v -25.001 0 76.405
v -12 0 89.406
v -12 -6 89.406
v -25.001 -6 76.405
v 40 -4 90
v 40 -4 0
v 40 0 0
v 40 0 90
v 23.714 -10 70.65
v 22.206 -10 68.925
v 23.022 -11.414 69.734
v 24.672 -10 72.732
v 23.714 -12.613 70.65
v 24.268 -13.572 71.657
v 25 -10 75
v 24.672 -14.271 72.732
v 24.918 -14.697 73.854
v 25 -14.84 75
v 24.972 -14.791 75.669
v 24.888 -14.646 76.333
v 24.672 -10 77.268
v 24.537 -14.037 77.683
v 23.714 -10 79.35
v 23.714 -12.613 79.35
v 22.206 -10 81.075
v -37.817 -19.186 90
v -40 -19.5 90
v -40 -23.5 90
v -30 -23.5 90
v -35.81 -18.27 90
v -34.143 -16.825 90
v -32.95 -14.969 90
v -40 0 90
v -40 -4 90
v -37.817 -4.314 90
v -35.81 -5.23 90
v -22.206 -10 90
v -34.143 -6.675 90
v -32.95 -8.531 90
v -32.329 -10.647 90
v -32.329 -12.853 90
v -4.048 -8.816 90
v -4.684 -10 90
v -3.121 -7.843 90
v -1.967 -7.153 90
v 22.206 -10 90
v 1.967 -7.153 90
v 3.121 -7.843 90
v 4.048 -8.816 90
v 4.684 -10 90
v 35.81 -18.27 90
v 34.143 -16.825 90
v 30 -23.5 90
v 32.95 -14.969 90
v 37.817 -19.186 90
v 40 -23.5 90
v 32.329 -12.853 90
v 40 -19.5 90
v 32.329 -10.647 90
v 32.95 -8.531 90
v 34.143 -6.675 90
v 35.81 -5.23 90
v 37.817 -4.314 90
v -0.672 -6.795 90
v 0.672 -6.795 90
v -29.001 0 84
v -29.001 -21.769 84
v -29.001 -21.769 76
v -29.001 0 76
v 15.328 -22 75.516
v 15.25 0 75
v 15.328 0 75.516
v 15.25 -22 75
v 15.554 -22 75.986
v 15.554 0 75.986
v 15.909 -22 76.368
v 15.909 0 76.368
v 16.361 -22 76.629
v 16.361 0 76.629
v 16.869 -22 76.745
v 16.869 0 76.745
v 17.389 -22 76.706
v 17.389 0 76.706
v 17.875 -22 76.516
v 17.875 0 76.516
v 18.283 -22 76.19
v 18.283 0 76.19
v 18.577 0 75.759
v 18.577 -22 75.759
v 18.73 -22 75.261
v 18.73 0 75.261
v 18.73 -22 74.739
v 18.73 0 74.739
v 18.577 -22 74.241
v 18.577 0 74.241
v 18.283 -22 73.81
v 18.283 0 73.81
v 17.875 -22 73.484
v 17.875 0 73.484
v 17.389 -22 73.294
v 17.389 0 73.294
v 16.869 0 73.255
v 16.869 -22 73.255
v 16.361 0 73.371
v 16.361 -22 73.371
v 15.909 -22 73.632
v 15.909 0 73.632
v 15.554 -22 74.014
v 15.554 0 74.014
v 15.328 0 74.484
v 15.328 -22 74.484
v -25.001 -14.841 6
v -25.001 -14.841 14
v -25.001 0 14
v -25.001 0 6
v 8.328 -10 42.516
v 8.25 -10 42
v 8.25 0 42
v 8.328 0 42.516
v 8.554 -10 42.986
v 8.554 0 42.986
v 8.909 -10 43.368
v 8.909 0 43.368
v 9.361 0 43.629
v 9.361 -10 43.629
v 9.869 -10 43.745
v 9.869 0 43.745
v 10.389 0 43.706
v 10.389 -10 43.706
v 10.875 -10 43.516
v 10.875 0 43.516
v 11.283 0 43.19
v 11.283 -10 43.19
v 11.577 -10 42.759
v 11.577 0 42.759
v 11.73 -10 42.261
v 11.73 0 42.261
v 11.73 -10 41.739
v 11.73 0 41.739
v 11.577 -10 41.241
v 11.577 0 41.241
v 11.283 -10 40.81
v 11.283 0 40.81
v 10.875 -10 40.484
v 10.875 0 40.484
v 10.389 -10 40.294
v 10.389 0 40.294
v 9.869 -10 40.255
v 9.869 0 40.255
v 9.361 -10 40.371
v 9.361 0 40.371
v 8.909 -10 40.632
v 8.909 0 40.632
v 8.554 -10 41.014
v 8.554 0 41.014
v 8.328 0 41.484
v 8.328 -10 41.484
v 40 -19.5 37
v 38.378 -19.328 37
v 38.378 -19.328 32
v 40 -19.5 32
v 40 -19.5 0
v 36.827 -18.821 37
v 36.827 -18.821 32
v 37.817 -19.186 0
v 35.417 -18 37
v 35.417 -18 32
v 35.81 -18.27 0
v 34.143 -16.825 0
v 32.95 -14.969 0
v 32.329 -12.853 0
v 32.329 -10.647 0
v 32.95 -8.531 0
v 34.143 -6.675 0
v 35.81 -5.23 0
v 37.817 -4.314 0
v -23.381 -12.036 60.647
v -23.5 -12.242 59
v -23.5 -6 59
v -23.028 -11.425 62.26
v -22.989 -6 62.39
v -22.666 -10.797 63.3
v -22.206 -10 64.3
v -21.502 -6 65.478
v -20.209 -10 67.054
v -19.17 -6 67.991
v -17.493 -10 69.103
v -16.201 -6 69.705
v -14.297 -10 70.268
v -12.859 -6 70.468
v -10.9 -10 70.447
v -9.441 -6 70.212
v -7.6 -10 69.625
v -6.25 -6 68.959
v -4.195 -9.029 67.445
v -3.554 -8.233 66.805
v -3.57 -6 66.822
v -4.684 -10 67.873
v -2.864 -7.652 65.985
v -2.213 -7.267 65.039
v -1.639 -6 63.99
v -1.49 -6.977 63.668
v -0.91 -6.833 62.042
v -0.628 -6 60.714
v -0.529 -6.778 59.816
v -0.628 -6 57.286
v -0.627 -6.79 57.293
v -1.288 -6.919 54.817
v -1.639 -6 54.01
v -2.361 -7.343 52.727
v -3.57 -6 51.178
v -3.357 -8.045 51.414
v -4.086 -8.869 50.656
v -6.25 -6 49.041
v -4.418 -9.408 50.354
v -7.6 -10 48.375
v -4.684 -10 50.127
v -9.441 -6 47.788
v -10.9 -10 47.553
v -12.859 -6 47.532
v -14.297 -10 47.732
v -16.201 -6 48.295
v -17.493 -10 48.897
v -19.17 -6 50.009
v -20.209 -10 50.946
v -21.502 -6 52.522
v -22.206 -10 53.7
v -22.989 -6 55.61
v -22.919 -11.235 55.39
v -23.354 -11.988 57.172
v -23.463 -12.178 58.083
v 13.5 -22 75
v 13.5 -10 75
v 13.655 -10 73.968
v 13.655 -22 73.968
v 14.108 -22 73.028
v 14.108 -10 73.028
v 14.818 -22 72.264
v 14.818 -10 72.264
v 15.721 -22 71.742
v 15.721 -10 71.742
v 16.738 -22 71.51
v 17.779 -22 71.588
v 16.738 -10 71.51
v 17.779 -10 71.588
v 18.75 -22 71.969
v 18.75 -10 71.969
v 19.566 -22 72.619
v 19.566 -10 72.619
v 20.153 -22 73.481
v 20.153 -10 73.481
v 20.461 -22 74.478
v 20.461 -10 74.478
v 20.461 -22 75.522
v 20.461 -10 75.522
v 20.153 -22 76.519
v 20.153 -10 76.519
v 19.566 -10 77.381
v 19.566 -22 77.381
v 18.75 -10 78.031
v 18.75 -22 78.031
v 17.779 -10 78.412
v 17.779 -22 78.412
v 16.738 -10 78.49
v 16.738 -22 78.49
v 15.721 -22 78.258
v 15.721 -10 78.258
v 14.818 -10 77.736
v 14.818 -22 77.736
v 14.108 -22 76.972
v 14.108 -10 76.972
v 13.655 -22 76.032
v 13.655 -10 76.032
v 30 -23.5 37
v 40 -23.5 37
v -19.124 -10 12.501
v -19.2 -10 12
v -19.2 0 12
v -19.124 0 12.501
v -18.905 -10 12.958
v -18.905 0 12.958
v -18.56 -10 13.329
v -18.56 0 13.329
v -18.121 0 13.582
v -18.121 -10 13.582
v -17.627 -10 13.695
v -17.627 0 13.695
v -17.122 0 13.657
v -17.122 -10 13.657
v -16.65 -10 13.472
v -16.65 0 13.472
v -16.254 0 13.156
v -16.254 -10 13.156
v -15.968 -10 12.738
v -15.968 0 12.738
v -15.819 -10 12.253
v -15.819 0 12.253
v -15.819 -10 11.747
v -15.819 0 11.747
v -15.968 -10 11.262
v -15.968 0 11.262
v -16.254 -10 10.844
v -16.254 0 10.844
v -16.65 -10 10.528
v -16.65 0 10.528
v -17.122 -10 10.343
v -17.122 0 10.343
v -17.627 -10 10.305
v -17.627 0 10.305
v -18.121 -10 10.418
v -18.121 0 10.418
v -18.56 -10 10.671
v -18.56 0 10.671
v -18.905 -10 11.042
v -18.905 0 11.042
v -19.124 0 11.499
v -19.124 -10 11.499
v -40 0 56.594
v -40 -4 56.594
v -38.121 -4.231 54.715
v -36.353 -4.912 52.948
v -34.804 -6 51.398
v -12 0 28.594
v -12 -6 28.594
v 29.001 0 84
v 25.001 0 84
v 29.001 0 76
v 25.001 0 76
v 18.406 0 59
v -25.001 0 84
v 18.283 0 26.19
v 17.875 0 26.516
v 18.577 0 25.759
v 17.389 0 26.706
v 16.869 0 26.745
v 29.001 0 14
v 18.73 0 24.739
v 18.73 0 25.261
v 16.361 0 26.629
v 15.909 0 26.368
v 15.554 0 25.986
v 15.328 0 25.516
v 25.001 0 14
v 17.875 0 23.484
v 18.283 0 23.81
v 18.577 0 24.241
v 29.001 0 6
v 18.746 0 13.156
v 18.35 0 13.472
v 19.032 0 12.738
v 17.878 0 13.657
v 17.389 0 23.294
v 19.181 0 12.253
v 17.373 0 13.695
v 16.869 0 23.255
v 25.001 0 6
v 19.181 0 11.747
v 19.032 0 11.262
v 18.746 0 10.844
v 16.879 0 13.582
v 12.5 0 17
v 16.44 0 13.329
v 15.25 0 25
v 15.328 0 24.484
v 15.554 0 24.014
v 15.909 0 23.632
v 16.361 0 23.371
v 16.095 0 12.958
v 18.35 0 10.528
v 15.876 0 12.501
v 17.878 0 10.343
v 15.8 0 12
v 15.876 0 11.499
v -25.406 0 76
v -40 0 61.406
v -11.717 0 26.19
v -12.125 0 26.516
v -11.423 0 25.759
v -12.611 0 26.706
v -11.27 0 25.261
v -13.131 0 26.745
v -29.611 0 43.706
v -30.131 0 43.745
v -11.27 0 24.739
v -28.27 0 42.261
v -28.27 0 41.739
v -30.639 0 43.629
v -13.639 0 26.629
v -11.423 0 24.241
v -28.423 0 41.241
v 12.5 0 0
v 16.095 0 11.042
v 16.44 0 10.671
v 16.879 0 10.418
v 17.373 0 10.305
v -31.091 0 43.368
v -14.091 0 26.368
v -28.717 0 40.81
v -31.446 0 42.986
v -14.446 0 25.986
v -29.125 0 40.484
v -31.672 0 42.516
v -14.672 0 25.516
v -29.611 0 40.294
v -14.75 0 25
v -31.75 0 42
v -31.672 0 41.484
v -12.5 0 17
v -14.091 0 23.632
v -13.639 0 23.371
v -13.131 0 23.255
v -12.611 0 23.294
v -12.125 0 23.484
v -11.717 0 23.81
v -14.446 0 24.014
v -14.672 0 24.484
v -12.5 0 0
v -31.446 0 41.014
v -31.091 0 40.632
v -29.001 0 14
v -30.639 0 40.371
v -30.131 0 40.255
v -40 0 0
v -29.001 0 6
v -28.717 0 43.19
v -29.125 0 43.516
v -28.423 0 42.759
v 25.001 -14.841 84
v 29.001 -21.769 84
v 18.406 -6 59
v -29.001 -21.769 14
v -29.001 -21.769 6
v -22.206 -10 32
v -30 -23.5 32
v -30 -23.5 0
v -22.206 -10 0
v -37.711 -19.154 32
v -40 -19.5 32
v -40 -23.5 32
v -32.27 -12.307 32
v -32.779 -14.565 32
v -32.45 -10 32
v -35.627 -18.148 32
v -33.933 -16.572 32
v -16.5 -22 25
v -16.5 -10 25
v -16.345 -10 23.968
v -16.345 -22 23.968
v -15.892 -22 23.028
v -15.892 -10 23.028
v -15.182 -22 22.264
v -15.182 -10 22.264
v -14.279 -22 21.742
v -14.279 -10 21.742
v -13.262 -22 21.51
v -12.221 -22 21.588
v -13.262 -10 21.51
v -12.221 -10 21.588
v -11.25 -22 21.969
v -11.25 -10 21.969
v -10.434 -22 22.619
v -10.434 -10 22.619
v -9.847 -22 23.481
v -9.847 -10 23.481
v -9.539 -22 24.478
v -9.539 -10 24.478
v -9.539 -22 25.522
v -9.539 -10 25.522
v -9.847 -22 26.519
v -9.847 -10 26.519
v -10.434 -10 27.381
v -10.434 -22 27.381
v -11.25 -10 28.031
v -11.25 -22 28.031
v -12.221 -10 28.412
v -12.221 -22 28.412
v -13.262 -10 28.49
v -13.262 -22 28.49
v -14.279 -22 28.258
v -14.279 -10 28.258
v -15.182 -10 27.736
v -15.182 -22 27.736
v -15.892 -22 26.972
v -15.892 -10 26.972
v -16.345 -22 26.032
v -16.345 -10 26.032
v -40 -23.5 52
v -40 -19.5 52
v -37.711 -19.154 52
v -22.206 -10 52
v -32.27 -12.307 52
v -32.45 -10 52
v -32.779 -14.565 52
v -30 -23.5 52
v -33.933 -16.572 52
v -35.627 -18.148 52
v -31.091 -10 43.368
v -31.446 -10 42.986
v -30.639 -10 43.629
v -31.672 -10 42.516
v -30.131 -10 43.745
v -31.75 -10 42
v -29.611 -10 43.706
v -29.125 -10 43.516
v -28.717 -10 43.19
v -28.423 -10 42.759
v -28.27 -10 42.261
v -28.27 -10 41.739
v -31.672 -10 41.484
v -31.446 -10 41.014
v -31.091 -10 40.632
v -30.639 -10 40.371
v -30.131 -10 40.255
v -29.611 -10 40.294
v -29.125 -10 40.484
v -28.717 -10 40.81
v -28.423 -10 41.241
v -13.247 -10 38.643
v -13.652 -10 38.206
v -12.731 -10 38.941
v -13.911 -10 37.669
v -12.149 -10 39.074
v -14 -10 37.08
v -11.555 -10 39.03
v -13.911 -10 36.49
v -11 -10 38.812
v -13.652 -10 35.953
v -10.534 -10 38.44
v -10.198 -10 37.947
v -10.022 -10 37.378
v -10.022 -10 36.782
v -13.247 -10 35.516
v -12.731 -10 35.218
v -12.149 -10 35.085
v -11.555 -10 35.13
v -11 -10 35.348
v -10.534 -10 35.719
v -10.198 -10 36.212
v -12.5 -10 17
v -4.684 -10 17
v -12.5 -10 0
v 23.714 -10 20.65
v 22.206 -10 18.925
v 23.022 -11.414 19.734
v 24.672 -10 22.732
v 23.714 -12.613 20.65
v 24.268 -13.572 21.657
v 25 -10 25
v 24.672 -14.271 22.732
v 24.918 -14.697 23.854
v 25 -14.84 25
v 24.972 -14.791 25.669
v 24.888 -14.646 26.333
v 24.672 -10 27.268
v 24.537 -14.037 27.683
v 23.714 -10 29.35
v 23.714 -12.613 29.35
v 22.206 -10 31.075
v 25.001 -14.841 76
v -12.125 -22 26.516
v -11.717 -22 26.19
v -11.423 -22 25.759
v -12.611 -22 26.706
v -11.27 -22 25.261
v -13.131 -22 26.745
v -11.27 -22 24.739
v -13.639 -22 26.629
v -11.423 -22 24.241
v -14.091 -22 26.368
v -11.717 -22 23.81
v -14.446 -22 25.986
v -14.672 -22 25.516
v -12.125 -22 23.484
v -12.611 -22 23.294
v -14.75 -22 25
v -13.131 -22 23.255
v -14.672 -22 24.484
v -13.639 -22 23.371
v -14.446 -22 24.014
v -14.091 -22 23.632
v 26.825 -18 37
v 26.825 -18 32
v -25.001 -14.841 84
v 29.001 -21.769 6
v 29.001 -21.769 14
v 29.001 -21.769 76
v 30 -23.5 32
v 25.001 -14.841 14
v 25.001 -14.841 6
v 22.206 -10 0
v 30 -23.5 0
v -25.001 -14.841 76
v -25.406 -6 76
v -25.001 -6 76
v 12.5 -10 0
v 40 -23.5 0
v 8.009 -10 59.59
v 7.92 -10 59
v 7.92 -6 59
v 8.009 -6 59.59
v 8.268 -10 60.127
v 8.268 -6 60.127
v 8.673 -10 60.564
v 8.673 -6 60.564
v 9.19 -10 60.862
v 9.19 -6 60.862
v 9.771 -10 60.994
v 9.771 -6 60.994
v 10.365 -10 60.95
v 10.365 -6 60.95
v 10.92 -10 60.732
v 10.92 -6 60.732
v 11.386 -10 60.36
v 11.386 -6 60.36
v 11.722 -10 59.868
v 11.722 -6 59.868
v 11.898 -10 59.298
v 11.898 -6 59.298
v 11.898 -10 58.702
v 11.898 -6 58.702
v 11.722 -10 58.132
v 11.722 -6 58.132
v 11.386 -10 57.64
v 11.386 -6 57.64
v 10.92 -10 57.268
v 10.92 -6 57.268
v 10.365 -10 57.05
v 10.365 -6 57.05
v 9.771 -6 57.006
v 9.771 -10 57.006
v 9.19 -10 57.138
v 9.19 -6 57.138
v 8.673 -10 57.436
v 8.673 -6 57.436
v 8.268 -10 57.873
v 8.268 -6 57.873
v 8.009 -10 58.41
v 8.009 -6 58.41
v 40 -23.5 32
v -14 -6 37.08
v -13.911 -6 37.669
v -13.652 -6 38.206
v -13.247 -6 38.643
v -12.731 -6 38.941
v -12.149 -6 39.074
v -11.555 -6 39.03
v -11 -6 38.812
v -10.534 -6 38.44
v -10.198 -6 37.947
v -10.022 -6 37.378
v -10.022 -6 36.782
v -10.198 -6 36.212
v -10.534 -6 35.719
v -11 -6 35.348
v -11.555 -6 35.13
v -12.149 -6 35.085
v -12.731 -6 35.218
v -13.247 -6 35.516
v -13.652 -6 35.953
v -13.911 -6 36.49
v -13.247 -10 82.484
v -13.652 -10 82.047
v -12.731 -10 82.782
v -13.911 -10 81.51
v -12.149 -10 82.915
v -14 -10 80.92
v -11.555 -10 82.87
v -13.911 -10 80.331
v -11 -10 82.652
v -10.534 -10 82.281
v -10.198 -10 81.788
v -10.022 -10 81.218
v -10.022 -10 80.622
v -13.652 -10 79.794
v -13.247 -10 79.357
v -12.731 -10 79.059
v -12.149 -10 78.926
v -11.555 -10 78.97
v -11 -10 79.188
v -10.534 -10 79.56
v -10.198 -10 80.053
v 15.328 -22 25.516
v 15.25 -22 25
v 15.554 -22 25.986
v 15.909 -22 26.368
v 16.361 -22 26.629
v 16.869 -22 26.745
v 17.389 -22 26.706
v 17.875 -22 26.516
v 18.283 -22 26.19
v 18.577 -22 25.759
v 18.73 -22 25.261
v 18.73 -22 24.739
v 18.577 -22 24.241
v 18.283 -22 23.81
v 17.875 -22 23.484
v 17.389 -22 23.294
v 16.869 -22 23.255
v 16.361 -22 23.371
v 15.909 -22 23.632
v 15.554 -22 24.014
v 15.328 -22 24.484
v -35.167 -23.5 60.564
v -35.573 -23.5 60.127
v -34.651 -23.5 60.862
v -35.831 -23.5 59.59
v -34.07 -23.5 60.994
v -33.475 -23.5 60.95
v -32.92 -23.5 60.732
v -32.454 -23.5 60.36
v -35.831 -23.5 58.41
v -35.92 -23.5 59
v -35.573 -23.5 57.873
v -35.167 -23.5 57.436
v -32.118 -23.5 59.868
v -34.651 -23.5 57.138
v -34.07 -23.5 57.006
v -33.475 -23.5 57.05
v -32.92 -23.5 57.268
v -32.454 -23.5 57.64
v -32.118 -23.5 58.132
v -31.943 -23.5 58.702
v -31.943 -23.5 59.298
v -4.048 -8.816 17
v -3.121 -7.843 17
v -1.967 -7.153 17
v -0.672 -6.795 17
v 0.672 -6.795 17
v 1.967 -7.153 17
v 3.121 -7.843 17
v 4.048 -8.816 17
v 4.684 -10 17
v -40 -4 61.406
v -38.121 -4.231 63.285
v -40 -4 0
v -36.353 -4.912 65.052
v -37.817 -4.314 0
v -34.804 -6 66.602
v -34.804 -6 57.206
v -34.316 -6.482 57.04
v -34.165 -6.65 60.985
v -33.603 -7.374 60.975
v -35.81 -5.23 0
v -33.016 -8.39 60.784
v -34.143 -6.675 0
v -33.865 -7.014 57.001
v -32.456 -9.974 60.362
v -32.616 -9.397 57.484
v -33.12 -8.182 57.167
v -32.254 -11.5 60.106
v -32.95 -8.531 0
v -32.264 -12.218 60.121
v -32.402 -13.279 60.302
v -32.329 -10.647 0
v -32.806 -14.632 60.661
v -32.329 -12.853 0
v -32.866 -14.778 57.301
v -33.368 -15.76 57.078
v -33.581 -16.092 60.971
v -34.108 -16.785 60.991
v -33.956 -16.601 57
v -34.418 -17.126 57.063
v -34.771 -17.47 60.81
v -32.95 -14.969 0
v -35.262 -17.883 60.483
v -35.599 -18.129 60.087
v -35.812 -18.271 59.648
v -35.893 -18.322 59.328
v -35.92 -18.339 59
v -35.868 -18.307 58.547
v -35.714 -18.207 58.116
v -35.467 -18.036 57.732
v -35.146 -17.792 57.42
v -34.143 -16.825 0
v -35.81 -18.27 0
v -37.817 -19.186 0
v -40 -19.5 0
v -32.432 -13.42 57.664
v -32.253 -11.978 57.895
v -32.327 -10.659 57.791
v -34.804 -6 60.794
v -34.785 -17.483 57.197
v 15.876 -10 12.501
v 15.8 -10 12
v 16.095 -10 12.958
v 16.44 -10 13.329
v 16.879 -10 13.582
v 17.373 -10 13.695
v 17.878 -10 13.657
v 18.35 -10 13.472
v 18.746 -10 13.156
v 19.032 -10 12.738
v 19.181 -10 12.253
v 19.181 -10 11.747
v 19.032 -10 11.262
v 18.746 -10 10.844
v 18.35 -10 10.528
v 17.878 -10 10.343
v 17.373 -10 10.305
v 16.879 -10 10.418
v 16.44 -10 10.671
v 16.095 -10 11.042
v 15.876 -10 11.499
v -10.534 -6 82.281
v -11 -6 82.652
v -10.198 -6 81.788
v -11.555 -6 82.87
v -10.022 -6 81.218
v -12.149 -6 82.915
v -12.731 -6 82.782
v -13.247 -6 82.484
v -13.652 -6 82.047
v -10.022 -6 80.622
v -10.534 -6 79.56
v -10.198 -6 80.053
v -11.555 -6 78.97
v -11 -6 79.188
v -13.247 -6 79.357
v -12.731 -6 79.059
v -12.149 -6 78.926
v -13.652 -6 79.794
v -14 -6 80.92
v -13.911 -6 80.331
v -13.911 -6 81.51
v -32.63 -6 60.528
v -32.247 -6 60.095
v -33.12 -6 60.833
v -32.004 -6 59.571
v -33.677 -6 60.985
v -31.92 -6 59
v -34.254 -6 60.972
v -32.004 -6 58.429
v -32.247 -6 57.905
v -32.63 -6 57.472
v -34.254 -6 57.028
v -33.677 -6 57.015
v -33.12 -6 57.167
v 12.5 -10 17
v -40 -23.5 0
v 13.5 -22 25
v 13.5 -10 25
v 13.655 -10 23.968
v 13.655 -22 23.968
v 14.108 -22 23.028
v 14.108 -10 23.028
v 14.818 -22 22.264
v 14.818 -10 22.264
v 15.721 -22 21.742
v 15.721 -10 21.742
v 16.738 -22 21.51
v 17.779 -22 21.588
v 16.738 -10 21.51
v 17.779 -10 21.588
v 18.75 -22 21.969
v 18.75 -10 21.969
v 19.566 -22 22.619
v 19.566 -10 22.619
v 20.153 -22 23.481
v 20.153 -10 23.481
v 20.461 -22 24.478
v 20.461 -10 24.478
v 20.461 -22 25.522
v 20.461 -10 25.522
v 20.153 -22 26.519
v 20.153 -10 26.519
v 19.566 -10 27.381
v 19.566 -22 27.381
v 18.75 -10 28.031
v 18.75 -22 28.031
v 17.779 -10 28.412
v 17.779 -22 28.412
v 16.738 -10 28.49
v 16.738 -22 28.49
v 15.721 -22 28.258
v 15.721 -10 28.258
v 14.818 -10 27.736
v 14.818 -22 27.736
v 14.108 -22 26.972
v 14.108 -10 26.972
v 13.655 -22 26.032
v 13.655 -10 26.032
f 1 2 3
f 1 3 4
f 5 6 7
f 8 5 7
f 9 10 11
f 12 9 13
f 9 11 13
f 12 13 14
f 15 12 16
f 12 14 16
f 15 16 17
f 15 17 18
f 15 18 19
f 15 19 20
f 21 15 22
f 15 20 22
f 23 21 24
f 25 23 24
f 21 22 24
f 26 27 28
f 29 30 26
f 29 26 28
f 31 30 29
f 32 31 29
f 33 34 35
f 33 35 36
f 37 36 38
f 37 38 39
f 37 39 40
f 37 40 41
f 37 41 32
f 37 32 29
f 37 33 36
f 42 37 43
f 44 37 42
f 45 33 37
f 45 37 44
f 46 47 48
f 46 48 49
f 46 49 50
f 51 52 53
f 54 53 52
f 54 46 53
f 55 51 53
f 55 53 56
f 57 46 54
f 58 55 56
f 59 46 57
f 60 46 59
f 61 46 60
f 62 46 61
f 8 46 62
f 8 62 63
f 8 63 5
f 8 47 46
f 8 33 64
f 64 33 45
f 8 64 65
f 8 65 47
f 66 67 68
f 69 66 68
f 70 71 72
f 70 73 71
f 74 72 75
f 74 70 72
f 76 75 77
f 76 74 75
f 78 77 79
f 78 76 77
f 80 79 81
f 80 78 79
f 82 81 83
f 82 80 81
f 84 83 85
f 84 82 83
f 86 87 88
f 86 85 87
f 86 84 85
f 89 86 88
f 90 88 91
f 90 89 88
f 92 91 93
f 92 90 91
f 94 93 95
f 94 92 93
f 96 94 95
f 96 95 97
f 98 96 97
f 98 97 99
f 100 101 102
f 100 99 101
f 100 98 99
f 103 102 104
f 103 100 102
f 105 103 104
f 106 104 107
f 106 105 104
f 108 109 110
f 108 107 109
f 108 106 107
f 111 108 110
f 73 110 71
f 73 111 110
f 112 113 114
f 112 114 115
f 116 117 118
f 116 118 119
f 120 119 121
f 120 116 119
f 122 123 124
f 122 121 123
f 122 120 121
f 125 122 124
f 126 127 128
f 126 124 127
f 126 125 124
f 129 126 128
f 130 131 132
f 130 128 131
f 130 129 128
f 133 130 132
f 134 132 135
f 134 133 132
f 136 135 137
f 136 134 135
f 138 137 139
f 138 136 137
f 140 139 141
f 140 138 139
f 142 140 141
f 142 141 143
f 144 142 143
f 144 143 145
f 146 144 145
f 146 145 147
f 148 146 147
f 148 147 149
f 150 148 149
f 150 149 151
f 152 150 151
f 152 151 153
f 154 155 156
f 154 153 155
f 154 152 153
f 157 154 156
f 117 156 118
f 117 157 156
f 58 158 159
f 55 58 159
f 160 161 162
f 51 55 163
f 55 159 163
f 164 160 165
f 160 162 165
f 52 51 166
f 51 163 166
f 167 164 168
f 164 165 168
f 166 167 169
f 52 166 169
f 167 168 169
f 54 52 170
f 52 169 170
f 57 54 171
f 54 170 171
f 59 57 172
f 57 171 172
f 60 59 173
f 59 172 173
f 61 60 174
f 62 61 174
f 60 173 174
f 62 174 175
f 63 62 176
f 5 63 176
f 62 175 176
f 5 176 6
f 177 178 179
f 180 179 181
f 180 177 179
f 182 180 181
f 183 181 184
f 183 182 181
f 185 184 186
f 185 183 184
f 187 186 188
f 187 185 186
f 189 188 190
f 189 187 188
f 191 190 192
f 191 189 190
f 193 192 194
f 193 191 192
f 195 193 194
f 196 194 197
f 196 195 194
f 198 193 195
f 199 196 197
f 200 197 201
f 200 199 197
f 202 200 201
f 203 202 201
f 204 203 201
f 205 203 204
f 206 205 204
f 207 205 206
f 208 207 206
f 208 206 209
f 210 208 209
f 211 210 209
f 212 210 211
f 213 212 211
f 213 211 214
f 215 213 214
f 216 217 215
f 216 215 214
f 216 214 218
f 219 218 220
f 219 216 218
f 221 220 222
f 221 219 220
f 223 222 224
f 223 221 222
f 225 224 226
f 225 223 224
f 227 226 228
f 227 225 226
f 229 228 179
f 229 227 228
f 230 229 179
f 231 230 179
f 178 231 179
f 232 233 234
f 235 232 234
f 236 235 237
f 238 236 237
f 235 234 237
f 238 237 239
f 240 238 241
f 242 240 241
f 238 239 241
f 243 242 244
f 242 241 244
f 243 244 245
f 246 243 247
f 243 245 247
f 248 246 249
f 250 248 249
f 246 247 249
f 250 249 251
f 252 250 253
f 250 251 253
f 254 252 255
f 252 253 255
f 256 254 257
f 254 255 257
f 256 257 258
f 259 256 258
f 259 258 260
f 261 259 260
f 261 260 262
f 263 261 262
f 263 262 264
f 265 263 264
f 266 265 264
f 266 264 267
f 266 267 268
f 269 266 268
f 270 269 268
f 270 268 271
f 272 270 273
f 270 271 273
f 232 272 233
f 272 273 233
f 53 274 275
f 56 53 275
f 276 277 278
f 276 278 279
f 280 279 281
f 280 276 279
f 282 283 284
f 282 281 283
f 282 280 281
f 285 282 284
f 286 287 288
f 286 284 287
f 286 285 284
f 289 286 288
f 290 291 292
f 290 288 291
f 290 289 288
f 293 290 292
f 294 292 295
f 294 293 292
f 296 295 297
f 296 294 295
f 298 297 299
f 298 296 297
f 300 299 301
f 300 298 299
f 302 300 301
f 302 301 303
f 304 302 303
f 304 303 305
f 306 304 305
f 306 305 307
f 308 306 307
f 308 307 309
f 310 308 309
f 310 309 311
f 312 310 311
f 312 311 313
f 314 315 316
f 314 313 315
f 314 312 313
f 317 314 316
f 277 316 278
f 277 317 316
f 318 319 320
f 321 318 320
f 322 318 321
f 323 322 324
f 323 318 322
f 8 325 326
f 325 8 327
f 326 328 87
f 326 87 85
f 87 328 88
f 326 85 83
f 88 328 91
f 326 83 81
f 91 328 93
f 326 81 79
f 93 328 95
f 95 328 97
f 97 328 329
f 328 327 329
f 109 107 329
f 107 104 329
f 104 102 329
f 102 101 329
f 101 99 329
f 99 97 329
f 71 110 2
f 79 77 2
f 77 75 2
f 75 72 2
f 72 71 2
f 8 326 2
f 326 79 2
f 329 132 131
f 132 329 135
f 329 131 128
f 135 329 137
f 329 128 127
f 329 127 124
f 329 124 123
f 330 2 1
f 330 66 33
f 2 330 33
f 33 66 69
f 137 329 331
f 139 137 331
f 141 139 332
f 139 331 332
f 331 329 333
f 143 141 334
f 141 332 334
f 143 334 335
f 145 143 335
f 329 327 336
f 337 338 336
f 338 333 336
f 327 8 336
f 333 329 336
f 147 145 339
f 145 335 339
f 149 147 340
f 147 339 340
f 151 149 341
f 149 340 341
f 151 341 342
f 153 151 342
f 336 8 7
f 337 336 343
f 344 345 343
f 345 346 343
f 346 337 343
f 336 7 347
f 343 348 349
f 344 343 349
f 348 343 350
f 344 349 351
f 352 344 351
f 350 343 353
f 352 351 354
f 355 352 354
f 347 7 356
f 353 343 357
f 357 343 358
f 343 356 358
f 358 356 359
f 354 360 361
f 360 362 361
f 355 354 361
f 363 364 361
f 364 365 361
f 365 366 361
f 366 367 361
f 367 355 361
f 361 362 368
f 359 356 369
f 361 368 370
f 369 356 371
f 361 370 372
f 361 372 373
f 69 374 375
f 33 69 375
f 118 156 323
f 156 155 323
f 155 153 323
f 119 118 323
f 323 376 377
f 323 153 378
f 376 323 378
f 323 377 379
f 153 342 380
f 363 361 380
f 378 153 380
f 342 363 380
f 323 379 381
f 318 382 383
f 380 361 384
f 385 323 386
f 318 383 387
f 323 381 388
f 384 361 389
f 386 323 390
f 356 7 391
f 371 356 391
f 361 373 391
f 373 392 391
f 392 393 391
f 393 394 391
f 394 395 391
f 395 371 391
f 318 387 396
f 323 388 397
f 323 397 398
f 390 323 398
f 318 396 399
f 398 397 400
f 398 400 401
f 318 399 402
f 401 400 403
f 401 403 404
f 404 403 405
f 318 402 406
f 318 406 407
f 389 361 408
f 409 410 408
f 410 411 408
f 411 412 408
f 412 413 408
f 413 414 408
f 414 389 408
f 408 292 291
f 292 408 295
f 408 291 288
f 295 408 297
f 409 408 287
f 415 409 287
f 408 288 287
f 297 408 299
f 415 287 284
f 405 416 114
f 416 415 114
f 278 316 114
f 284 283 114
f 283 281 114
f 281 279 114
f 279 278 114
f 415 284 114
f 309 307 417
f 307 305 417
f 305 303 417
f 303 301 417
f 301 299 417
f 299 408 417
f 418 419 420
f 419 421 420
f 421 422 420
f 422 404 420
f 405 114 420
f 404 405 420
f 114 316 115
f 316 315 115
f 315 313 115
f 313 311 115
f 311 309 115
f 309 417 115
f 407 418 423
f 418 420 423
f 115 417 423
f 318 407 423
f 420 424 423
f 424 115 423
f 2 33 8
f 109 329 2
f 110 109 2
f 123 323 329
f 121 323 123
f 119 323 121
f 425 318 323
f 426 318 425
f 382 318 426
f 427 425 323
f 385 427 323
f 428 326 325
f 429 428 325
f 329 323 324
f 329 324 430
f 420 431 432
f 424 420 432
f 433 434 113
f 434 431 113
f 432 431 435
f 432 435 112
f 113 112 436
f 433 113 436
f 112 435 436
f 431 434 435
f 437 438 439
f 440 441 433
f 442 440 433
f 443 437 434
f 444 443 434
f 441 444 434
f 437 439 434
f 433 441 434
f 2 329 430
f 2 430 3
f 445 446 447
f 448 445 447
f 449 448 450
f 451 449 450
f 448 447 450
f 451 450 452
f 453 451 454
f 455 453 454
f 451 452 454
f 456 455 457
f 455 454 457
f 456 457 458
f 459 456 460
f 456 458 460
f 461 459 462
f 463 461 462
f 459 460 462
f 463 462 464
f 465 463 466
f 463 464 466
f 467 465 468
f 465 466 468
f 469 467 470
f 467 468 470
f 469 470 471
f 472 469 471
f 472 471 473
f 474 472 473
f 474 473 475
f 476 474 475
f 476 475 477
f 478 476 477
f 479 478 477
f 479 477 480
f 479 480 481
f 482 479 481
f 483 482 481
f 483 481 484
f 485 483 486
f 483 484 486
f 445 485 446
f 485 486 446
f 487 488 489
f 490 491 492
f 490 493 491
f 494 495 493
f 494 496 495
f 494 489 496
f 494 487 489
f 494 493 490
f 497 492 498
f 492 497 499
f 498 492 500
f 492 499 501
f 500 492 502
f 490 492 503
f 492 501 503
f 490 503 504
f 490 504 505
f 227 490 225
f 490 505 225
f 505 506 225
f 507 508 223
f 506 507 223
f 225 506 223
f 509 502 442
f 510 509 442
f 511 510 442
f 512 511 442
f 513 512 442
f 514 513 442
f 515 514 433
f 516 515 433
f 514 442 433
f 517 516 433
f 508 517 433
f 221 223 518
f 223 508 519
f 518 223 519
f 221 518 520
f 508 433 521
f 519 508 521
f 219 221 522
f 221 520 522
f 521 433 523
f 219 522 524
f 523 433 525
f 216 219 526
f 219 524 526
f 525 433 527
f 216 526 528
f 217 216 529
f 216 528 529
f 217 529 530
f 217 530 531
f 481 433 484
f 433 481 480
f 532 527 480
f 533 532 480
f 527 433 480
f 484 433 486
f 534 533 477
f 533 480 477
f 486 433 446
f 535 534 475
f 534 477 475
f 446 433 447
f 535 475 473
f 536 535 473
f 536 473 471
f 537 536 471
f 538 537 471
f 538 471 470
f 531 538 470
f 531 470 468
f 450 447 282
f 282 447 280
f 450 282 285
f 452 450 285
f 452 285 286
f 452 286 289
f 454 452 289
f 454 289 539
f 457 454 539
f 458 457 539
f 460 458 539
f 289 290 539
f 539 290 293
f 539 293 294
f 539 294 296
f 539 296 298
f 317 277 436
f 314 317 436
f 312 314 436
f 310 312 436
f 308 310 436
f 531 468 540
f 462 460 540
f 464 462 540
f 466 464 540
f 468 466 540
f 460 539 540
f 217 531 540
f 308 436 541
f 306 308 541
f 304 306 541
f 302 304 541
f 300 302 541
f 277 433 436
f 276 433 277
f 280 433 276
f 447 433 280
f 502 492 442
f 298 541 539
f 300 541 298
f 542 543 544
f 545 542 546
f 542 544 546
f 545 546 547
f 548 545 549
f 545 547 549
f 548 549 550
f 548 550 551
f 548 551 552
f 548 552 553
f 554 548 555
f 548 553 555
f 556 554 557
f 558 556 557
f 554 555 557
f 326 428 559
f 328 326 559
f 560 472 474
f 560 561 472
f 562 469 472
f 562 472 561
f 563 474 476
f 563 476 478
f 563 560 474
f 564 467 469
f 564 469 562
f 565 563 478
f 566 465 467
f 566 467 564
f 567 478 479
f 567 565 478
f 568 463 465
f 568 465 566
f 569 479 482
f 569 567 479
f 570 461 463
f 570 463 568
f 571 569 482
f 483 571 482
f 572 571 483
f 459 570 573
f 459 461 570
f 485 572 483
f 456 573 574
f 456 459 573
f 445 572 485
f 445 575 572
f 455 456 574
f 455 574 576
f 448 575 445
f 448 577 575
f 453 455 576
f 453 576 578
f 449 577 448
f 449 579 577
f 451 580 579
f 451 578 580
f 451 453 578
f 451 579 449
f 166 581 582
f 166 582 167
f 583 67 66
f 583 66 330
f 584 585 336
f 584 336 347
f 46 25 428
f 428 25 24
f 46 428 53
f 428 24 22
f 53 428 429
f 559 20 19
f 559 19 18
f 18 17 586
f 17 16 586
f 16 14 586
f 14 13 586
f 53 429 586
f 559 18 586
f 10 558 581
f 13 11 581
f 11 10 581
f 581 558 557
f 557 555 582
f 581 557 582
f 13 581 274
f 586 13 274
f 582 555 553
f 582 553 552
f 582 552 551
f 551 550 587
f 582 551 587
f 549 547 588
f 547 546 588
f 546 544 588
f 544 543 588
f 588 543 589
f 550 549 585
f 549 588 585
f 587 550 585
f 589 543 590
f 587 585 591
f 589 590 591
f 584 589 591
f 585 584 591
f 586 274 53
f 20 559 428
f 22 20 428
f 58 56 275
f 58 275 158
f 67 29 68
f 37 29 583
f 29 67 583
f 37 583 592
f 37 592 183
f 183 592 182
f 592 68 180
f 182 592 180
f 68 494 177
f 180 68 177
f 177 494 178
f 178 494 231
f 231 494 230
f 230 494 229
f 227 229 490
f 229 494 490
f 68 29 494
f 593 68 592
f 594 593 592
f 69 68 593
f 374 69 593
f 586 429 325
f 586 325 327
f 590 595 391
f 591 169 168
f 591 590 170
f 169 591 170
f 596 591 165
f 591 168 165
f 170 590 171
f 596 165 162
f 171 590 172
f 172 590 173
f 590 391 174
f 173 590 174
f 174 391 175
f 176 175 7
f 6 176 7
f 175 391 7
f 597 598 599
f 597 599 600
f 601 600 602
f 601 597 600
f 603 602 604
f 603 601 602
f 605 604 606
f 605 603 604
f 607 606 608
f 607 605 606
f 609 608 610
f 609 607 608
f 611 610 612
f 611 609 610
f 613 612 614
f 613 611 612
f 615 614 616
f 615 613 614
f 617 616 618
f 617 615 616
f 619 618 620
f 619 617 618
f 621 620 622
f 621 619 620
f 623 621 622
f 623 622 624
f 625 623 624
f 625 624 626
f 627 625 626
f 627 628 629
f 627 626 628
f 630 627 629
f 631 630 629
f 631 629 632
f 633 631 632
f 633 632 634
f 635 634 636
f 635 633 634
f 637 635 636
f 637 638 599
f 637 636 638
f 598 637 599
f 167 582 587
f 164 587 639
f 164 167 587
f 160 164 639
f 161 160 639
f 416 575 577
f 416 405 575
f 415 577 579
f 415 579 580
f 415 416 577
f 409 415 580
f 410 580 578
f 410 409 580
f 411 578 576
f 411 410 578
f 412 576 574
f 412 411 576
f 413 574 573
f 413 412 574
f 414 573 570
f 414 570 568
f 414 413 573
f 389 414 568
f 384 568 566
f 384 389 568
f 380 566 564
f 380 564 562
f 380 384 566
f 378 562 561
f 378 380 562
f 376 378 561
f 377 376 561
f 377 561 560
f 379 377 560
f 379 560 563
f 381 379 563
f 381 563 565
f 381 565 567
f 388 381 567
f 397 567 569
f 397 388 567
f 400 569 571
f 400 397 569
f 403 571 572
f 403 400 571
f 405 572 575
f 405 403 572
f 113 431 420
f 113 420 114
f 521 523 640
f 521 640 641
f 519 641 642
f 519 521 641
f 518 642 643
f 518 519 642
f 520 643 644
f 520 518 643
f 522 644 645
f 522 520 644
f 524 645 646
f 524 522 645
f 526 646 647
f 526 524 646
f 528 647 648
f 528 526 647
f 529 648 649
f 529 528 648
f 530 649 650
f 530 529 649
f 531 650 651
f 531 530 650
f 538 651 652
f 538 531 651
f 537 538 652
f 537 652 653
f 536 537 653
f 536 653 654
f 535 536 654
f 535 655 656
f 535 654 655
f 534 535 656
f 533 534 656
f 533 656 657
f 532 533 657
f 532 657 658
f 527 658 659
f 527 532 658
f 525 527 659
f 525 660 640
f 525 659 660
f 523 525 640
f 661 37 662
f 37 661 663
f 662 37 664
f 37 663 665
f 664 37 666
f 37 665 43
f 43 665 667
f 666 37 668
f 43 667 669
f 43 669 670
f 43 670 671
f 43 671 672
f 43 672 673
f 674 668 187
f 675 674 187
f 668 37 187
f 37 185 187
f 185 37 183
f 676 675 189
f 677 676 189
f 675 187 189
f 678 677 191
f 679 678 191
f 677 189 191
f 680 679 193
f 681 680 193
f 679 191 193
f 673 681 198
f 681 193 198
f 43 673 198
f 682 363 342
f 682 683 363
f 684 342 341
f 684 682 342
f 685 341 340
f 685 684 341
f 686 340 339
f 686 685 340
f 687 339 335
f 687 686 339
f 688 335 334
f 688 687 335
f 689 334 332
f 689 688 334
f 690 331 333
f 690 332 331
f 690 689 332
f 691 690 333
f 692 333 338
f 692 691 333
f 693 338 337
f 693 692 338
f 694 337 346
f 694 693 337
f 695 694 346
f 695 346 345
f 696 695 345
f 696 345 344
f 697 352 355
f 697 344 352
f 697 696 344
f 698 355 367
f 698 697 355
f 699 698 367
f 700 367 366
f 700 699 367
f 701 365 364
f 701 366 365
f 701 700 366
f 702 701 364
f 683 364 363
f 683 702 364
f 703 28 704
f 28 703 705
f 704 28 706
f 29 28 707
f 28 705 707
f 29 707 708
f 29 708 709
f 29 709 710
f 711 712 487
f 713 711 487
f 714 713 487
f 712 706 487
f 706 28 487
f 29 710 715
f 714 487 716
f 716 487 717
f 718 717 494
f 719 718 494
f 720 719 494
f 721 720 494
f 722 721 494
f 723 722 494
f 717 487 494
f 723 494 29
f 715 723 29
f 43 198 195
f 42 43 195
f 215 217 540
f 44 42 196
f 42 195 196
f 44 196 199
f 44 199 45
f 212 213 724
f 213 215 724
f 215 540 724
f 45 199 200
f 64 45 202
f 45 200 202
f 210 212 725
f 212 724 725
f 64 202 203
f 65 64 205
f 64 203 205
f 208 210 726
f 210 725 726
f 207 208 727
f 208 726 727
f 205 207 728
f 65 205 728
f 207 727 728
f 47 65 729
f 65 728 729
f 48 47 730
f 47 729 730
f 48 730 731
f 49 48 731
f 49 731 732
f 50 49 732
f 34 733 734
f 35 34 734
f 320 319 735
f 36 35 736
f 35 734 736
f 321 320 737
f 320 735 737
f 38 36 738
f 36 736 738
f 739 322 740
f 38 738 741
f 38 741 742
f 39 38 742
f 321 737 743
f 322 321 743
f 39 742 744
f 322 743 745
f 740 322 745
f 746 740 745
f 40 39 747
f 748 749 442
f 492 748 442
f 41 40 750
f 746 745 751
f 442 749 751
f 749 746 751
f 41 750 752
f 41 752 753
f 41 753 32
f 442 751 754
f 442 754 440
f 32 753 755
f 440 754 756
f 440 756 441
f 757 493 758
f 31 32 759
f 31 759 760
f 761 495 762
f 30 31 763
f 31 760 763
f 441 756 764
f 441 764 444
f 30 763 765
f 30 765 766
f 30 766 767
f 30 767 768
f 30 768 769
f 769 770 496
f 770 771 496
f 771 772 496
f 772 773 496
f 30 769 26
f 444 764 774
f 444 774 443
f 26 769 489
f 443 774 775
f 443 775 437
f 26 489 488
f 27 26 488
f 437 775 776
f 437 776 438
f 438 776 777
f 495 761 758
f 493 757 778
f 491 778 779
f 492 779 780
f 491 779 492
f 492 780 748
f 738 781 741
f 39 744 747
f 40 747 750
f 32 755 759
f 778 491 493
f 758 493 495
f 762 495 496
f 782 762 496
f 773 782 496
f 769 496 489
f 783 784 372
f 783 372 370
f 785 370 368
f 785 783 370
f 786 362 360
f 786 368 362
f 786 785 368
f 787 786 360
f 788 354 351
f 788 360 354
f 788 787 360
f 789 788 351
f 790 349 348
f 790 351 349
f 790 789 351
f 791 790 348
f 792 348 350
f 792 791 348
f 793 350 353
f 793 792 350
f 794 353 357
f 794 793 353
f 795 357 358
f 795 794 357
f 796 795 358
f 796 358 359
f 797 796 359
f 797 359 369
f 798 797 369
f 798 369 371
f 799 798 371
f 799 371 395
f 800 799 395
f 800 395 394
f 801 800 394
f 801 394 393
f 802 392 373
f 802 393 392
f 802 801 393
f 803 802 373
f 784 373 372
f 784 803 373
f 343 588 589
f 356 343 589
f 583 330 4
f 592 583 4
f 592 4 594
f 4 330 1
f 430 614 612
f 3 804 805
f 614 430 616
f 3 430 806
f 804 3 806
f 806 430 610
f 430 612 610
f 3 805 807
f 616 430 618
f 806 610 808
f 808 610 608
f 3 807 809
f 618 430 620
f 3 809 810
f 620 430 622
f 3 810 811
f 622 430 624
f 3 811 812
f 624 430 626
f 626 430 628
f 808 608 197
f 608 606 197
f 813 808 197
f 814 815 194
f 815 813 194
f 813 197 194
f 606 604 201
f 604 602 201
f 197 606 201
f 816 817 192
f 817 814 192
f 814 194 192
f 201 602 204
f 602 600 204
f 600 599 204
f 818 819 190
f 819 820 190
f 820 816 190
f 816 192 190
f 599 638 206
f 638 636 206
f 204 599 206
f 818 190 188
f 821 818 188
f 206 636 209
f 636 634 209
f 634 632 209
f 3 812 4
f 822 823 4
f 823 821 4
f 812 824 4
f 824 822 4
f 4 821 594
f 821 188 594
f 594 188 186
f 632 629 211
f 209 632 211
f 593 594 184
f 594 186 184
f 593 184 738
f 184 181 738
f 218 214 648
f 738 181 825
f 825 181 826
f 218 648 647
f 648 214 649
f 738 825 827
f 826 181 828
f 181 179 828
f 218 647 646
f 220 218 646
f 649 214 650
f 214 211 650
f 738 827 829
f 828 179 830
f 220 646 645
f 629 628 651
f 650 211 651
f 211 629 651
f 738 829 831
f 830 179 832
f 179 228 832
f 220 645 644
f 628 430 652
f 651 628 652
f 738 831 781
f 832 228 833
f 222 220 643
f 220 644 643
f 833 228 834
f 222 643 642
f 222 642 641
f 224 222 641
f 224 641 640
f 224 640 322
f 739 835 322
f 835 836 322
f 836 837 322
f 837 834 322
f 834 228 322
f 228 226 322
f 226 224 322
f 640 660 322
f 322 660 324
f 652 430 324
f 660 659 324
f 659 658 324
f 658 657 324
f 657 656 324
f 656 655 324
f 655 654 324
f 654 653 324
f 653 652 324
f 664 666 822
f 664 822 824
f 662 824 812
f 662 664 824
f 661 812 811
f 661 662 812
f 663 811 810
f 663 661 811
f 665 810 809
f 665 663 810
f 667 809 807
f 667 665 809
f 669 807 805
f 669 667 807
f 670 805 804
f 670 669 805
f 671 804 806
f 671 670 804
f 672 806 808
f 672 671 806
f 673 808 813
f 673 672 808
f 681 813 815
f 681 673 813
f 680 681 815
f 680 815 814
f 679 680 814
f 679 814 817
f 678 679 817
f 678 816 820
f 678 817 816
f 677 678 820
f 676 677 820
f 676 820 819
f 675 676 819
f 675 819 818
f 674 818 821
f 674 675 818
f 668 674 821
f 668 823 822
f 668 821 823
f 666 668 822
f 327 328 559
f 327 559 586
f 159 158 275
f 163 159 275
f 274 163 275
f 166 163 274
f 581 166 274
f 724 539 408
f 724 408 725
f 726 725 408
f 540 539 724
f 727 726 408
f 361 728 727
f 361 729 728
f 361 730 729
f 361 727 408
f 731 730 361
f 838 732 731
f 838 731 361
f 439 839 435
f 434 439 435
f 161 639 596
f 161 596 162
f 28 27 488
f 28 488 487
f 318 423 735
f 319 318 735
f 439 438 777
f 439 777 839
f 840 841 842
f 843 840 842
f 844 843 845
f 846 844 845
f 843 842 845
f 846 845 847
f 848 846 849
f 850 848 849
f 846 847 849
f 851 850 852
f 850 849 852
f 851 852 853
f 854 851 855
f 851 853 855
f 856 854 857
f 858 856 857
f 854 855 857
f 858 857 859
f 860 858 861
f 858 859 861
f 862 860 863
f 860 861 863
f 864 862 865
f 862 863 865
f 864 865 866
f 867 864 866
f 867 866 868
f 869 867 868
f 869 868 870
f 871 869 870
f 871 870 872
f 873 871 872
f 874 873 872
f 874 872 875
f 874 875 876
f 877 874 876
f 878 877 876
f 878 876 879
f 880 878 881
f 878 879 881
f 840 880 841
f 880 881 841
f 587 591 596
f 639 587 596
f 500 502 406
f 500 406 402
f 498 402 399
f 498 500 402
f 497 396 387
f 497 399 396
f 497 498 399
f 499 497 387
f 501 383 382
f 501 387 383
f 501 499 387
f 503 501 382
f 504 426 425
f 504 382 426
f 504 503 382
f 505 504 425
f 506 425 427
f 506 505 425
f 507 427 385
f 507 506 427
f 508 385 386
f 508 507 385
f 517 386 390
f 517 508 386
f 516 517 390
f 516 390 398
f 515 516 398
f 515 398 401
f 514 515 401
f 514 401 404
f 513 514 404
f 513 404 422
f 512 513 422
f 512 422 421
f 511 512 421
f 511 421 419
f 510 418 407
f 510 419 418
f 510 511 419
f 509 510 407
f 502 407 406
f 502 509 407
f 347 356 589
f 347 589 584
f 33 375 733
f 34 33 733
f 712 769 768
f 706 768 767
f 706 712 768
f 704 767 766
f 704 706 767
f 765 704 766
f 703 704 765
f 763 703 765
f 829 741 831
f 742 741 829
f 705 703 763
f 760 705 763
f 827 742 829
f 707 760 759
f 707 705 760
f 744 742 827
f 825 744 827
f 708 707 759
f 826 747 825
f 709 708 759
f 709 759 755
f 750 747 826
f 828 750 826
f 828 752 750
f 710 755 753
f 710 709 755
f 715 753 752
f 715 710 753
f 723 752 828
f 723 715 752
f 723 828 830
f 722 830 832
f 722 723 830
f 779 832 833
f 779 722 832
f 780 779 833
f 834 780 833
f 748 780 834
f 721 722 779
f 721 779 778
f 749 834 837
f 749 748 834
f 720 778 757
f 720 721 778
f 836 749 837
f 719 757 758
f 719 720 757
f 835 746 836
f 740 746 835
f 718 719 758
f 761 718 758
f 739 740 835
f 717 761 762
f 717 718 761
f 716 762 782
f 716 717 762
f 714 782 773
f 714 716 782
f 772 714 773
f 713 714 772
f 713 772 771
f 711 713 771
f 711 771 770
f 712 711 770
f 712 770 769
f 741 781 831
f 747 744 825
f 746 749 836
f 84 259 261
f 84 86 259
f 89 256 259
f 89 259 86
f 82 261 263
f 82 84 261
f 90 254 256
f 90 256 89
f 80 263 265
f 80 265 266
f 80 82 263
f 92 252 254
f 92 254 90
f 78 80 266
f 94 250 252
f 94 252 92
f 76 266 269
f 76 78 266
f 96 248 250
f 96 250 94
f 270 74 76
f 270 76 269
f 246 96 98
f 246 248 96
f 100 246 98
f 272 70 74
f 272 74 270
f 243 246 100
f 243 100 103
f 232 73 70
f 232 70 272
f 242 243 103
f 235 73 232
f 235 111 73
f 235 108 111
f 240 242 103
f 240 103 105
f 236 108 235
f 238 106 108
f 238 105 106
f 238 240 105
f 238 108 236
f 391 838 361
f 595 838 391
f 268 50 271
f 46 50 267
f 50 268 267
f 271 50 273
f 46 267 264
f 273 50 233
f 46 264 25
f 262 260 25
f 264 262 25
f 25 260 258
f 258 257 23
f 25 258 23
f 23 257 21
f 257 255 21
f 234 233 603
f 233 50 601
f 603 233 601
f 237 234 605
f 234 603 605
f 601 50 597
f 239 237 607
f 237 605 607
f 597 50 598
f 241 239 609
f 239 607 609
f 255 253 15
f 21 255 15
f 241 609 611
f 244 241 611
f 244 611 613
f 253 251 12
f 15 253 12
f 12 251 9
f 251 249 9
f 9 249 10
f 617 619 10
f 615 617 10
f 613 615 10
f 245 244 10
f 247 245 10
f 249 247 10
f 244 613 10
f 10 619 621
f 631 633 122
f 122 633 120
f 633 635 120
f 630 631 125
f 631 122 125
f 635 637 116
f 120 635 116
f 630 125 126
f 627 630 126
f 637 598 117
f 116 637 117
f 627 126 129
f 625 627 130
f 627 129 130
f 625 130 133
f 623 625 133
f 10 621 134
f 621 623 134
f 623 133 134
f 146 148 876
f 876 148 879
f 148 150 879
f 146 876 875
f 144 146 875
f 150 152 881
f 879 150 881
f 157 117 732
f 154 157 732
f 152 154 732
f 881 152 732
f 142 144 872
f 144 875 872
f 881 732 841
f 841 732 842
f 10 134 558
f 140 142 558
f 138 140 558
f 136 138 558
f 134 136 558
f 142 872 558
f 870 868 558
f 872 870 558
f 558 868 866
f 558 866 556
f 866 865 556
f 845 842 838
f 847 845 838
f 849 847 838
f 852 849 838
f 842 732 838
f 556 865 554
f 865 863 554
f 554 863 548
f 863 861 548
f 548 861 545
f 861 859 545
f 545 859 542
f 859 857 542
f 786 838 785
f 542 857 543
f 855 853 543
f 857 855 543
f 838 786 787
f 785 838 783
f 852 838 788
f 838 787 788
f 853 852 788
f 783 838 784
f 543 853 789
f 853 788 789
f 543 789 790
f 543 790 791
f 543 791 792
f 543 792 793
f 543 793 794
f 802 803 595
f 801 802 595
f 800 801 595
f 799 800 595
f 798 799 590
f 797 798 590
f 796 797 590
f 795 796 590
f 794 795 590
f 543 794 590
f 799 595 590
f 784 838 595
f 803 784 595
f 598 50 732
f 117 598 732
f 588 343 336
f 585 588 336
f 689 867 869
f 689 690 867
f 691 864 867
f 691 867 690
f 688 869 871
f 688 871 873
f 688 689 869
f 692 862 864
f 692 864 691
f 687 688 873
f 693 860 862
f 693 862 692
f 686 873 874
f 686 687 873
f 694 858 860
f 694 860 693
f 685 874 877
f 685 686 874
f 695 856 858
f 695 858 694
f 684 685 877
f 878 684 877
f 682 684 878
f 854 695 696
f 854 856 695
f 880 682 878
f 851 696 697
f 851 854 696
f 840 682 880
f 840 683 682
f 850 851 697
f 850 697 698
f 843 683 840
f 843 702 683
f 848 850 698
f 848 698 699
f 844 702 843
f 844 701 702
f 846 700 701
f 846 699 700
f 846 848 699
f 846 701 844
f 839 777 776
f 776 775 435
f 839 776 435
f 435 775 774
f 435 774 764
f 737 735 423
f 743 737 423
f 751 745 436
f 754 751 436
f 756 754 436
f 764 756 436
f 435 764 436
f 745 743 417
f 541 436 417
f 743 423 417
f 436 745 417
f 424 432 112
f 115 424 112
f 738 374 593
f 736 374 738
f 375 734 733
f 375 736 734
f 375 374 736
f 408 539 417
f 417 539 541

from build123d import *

# Parameters (mm, degrees)
RESSALTO_EXTRUS_O1_DEPTH   = 90
ESBO_O2_R                  = 5
CORTE_EXTRUS_O1_DEPTH      = 6
CORTE_EXTRUS_O2_DEPTH      = 101.031245119
CORTE_EXTRUS_O2_DEPTH_BACK = 101.031245119
ESBO_O3_R                  = 2
ESBO_O3_R_2                = 11.5
ESBO_O3_R_3                = 1.75
ESBO_O3_R_4                = 1.7
ESBO_O3_W                  = 25
ESBO_O3_H                  = 17
CORTE_EXTRUS_O4_START      = 8
ESBO_O4_W                  = 22.305447344
ESBO_O4_H                  = 5
ESBO_O4_W_2                = 48.791448981
CORTE_EXTRUS_O4_DEPTH      = 12
CORTE_EXTRUS_O7_REACH      = 103.253
ESBO_O6_R                  = 8
ESBO_O6_W                  = 20
ESBO_O6_H                  = 20
ESBO_O7_W                  = 4
ESBO_O7_H                  = 8
CORTE_EXTRUS_O8_DEPTH      = 102.253395156
ESBO_O11_R                 = 3.5
ESBO_O11_R_2               = 1.75
RESSALTO_EXTRUS_O3_DEPTH   = 12


with BuildPart() as part:
    # Esboço1 → Ressalto-extrusão1 (new body)
    with BuildSketch(Plane.XY):
        with BuildLine():
            Line((40, 0), (-40, 0))
            Line((-40, 0), (-40, -4))
            ThreePointArc((-40, -4), (-32.25, -11.75), (-40, -19.5))
            Line((-40, -19.5), (-40, -23.5))
            Line((-40, -23.5), (-30, -23.5))
            Line((-30, -23.5), (-22.205771366, -10))
            Line((-22.205771366, -10), (-4.683748499, -10))
            ThreePointArc((-4.683748499, -10), (0, -6.75), (4.683748499, -10))
            Line((4.683748499, -10), (22.205771366, -10))
            Line((22.205771366, -10), (30, -23.5))
            Line((30, -23.5), (40, -23.5))
            Line((40, -23.5), (40, -19.5))
            ThreePointArc((40, -19.5), (32.25, -11.75), (40, -4))
            Line((40, -4), (40, 0))
        make_face()
    extrude(amount=RESSALTO_EXTRUS_O1_DEPTH)

    # Esboço2 → Corte-extrusão1 (cut)
    with BuildSketch(Plane(origin=(0, 0, 0), x_dir=(1, 0, 0), z_dir=(0, 1, 0))):
        Polygon((-42.405591591, -59), (-12, -28.594408409), (18.405591591, -59), (-12, -89.405591591), align=None)
        with Locations(Location((-12, -59, 0), (0, 0, 270))):
            Circle(ESBO_O2_R, mode=Mode.SUBTRACT)
    extrude(amount=-CORTE_EXTRUS_O1_DEPTH, mode=Mode.SUBTRACT)

    # Esboço3 → Corte-extrusão2 (cut, two sides: drawn at the far end of the back side and taken through both)
    with BuildSketch(Plane(origin=(0, -6, 0), x_dir=(1, 0, 0), z_dir=(0, 1, 0)).offset(-CORTE_EXTRUS_O2_DEPTH_BACK)):
        with Locations(Location((-12, -37.079689783, 0), (0, 0, 180))):
            Circle(ESBO_O3_R)
        with Locations(Location((9.920310217, -59, 0), (0, 0, 180))):
            Circle(ESBO_O3_R)
        with Locations(Location((-12, -80.920310217, 0), (0, 0, 180))):
            Circle(ESBO_O3_R)
        with Locations(Location((-33.920310217, -59, 0), (0, 0, 180))):
            Circle(ESBO_O3_R)
        with Locations(Location((-12, -59, 0), (0, 0, 180))):
            Circle(ESBO_O3_R_2)
        with Locations(Location((-30, -42, 0), (0, 0, 180))):
            Circle(ESBO_O3_R_3)
        with Locations(Location((10, -42, 0), (0, 0, 180))):
            Circle(ESBO_O3_R_3)
        with Locations(Location((-17.5, -12, 0), (0, 0, 180))):
            Circle(ESBO_O3_R_4)
        with Locations(Location((17.5, -12, 0), (0, 0, 180))):
            Circle(ESBO_O3_R_4)
        with Locations(Location((17, -75, 0), (0, 0, 180))):
            Circle(ESBO_O3_R_3)
        with Locations(Location((-13, -25, 0), (0, 0, 180))):
            Circle(ESBO_O3_R_3)
        with Locations(Location((17, -25, 0), (0, 0, 180))):
            Circle(ESBO_O3_R_3)
        with Locations((0, -8.5)):
            Rectangle(ESBO_O3_W, ESBO_O3_H)
    extrude(amount=CORTE_EXTRUS_O2_DEPTH + CORTE_EXTRUS_O2_DEPTH_BACK, mode=Mode.SUBTRACT)

    # Esboço4 → Corte-extrusão4 (cut)
    with BuildSketch(Plane.XZ.offset(10).offset(CORTE_EXTRUS_O4_START)):
        with BuildLine():
            Line((-13.998411754, 37), (-22.205771366, 37))
            Line((-22.205771366, 37), (-22.205771366, 32))
            Line((-22.205771366, 32), (-4.683748499, 32))
            Line((-4.683748499, 32), (-4.683748499, 37))
            Line((-4.683748499, 37), (-10.001588246, 37))
            ThreePointArc((-10.001588246, 37), (-12, 35.079689783), (-13.998411754, 37))
        make_face()
        with Locations((-33.358495038, 34.5)):
            Rectangle(ESBO_O4_W, ESBO_O4_H)
        with Locations((19.711975992, 34.5)):
            Rectangle(ESBO_O4_W_2, ESBO_O4_H)
    extrude(amount=CORTE_EXTRUS_O4_DEPTH, mode=Mode.SUBTRACT)

    # Corte-extrusão7: up to this face of the body (flat: up to its plane)
    corte_extrus_o7_end = Plane(part.part.faces().sort_by_distance((-13.702636596, -10, 79.456396835))[0])
    # Esboço6 → Corte-extrusão7 (cut, up to the picked face)
    with BuildSketch(Plane.XZ.offset(23.5), mode=Mode.PRIVATE) as corte_extrus_o7_sk1:
        with Locations((17, 75)):
            Circle(ESBO_O6_R)
    corte_extrus_o7_tool1 = split(extrude(corte_extrus_o7_sk1.sketch, amount=-CORTE_EXTRUS_O7_REACH, mode=Mode.PRIVATE), bisect_by=corte_extrus_o7_end, keep=Keep.BOTH, mode=Mode.PRIVATE)
    # Esboço6 → Corte-extrusão7 (cut, up to the picked face)
    with BuildSketch(Plane.XZ.offset(23.5), mode=Mode.PRIVATE) as corte_extrus_o7_sk2:
        with Locations((17, 25)):
            Circle(ESBO_O6_R)
    corte_extrus_o7_tool2 = split(extrude(corte_extrus_o7_sk2.sketch, amount=-CORTE_EXTRUS_O7_REACH, mode=Mode.PRIVATE), bisect_by=corte_extrus_o7_end, keep=Keep.BOTH, mode=Mode.PRIVATE)
    # Esboço6 → Corte-extrusão7 (cut, up to the picked face)
    with BuildSketch(Plane.XZ.offset(23.5), mode=Mode.PRIVATE) as corte_extrus_o7_sk3:
        with Locations((-13, 25)):
            Circle(ESBO_O6_R)
    corte_extrus_o7_tool3 = split(extrude(corte_extrus_o7_sk3.sketch, amount=-CORTE_EXTRUS_O7_REACH, mode=Mode.PRIVATE), bisect_by=corte_extrus_o7_end, keep=Keep.BOTH, mode=Mode.PRIVATE)
    # Esboço6 → Corte-extrusão7 (cut, up to the picked face)
    with BuildSketch(Plane.XZ.offset(23.5), mode=Mode.PRIVATE) as corte_extrus_o7_sk4:
        with Locations((-30, 42)):
            Rectangle(ESBO_O6_W, ESBO_O6_H)
    corte_extrus_o7_tool4 = split(extrude(corte_extrus_o7_sk4.sketch, amount=-CORTE_EXTRUS_O7_REACH, mode=Mode.PRIVATE), bisect_by=corte_extrus_o7_end, keep=Keep.BOTH, mode=Mode.PRIVATE)
    add(corte_extrus_o7_tool1.solids().sort_by(Axis((17, -23.5, 75), (0, 1, 0)))[0], mode=Mode.SUBTRACT)
    add(corte_extrus_o7_tool2.solids().sort_by(Axis((17, -23.5, 25), (0, 1, 0)))[0], mode=Mode.SUBTRACT)
    add(corte_extrus_o7_tool3.solids().sort_by(Axis((-13, -23.5, 25), (0, 1, 0)))[0], mode=Mode.SUBTRACT)
    add(corte_extrus_o7_tool4.solids().sort_by(Axis((-30, -23.5, 42), (0, 1, 0)))[0], mode=Mode.SUBTRACT)

    # Esboço7 → Corte-extrusão8 (cut, through all)
    with BuildSketch(Plane(origin=(0, 0, 0), x_dir=(1, 0, 0), z_dir=(0, 1, 0))):
        with Locations((27.000875928, -80)):
            Rectangle(ESBO_O7_W, ESBO_O7_H)
        with Locations((27.000875928, -10)):
            Rectangle(ESBO_O7_W, ESBO_O7_H)
        with Locations((-27.000875928, -10)):
            Rectangle(ESBO_O7_W, ESBO_O7_H)
        with Locations((-27.000875928, -80)):
            Rectangle(ESBO_O7_W, ESBO_O7_H)
    extrude(amount=-CORTE_EXTRUS_O8_DEPTH, mode=Mode.SUBTRACT)

    # Esboço11 → Ressalto-extrusão3 (add)
    # profile 1 of 3: a face of its own
    with BuildSketch(Plane.XZ.offset(10)):
        with Locations(Location((-13, 25, 0), (0, 0, 180))):
            Circle(ESBO_O11_R)
        with Locations(Location((-13, 25, 0), (0, 0, 180))):
            Circle(ESBO_O11_R_2, mode=Mode.SUBTRACT)
    # profile 2 of 3: a face of its own
    with BuildSketch(Plane.XZ.offset(10)):
        with Locations(Location((17, 25, 0), (0, 0, 180))):
            Circle(ESBO_O11_R)
        with Locations(Location((17, 25, 0), (0, 0, 180))):
            Circle(ESBO_O11_R_2, mode=Mode.SUBTRACT)
    # profile 3 of 3: a face of its own
    with BuildSketch(Plane.XZ.offset(10)):
        with Locations(Location((17, 75, 0), (0, 0, 180))):
            Circle(ESBO_O11_R)
        with Locations(Location((17, 75, 0), (0, 0, 180))):
            Circle(ESBO_O11_R_2, mode=Mode.SUBTRACT)
    extrude(amount=RESSALTO_EXTRUS_O3_DEPTH)


solid = part.part
